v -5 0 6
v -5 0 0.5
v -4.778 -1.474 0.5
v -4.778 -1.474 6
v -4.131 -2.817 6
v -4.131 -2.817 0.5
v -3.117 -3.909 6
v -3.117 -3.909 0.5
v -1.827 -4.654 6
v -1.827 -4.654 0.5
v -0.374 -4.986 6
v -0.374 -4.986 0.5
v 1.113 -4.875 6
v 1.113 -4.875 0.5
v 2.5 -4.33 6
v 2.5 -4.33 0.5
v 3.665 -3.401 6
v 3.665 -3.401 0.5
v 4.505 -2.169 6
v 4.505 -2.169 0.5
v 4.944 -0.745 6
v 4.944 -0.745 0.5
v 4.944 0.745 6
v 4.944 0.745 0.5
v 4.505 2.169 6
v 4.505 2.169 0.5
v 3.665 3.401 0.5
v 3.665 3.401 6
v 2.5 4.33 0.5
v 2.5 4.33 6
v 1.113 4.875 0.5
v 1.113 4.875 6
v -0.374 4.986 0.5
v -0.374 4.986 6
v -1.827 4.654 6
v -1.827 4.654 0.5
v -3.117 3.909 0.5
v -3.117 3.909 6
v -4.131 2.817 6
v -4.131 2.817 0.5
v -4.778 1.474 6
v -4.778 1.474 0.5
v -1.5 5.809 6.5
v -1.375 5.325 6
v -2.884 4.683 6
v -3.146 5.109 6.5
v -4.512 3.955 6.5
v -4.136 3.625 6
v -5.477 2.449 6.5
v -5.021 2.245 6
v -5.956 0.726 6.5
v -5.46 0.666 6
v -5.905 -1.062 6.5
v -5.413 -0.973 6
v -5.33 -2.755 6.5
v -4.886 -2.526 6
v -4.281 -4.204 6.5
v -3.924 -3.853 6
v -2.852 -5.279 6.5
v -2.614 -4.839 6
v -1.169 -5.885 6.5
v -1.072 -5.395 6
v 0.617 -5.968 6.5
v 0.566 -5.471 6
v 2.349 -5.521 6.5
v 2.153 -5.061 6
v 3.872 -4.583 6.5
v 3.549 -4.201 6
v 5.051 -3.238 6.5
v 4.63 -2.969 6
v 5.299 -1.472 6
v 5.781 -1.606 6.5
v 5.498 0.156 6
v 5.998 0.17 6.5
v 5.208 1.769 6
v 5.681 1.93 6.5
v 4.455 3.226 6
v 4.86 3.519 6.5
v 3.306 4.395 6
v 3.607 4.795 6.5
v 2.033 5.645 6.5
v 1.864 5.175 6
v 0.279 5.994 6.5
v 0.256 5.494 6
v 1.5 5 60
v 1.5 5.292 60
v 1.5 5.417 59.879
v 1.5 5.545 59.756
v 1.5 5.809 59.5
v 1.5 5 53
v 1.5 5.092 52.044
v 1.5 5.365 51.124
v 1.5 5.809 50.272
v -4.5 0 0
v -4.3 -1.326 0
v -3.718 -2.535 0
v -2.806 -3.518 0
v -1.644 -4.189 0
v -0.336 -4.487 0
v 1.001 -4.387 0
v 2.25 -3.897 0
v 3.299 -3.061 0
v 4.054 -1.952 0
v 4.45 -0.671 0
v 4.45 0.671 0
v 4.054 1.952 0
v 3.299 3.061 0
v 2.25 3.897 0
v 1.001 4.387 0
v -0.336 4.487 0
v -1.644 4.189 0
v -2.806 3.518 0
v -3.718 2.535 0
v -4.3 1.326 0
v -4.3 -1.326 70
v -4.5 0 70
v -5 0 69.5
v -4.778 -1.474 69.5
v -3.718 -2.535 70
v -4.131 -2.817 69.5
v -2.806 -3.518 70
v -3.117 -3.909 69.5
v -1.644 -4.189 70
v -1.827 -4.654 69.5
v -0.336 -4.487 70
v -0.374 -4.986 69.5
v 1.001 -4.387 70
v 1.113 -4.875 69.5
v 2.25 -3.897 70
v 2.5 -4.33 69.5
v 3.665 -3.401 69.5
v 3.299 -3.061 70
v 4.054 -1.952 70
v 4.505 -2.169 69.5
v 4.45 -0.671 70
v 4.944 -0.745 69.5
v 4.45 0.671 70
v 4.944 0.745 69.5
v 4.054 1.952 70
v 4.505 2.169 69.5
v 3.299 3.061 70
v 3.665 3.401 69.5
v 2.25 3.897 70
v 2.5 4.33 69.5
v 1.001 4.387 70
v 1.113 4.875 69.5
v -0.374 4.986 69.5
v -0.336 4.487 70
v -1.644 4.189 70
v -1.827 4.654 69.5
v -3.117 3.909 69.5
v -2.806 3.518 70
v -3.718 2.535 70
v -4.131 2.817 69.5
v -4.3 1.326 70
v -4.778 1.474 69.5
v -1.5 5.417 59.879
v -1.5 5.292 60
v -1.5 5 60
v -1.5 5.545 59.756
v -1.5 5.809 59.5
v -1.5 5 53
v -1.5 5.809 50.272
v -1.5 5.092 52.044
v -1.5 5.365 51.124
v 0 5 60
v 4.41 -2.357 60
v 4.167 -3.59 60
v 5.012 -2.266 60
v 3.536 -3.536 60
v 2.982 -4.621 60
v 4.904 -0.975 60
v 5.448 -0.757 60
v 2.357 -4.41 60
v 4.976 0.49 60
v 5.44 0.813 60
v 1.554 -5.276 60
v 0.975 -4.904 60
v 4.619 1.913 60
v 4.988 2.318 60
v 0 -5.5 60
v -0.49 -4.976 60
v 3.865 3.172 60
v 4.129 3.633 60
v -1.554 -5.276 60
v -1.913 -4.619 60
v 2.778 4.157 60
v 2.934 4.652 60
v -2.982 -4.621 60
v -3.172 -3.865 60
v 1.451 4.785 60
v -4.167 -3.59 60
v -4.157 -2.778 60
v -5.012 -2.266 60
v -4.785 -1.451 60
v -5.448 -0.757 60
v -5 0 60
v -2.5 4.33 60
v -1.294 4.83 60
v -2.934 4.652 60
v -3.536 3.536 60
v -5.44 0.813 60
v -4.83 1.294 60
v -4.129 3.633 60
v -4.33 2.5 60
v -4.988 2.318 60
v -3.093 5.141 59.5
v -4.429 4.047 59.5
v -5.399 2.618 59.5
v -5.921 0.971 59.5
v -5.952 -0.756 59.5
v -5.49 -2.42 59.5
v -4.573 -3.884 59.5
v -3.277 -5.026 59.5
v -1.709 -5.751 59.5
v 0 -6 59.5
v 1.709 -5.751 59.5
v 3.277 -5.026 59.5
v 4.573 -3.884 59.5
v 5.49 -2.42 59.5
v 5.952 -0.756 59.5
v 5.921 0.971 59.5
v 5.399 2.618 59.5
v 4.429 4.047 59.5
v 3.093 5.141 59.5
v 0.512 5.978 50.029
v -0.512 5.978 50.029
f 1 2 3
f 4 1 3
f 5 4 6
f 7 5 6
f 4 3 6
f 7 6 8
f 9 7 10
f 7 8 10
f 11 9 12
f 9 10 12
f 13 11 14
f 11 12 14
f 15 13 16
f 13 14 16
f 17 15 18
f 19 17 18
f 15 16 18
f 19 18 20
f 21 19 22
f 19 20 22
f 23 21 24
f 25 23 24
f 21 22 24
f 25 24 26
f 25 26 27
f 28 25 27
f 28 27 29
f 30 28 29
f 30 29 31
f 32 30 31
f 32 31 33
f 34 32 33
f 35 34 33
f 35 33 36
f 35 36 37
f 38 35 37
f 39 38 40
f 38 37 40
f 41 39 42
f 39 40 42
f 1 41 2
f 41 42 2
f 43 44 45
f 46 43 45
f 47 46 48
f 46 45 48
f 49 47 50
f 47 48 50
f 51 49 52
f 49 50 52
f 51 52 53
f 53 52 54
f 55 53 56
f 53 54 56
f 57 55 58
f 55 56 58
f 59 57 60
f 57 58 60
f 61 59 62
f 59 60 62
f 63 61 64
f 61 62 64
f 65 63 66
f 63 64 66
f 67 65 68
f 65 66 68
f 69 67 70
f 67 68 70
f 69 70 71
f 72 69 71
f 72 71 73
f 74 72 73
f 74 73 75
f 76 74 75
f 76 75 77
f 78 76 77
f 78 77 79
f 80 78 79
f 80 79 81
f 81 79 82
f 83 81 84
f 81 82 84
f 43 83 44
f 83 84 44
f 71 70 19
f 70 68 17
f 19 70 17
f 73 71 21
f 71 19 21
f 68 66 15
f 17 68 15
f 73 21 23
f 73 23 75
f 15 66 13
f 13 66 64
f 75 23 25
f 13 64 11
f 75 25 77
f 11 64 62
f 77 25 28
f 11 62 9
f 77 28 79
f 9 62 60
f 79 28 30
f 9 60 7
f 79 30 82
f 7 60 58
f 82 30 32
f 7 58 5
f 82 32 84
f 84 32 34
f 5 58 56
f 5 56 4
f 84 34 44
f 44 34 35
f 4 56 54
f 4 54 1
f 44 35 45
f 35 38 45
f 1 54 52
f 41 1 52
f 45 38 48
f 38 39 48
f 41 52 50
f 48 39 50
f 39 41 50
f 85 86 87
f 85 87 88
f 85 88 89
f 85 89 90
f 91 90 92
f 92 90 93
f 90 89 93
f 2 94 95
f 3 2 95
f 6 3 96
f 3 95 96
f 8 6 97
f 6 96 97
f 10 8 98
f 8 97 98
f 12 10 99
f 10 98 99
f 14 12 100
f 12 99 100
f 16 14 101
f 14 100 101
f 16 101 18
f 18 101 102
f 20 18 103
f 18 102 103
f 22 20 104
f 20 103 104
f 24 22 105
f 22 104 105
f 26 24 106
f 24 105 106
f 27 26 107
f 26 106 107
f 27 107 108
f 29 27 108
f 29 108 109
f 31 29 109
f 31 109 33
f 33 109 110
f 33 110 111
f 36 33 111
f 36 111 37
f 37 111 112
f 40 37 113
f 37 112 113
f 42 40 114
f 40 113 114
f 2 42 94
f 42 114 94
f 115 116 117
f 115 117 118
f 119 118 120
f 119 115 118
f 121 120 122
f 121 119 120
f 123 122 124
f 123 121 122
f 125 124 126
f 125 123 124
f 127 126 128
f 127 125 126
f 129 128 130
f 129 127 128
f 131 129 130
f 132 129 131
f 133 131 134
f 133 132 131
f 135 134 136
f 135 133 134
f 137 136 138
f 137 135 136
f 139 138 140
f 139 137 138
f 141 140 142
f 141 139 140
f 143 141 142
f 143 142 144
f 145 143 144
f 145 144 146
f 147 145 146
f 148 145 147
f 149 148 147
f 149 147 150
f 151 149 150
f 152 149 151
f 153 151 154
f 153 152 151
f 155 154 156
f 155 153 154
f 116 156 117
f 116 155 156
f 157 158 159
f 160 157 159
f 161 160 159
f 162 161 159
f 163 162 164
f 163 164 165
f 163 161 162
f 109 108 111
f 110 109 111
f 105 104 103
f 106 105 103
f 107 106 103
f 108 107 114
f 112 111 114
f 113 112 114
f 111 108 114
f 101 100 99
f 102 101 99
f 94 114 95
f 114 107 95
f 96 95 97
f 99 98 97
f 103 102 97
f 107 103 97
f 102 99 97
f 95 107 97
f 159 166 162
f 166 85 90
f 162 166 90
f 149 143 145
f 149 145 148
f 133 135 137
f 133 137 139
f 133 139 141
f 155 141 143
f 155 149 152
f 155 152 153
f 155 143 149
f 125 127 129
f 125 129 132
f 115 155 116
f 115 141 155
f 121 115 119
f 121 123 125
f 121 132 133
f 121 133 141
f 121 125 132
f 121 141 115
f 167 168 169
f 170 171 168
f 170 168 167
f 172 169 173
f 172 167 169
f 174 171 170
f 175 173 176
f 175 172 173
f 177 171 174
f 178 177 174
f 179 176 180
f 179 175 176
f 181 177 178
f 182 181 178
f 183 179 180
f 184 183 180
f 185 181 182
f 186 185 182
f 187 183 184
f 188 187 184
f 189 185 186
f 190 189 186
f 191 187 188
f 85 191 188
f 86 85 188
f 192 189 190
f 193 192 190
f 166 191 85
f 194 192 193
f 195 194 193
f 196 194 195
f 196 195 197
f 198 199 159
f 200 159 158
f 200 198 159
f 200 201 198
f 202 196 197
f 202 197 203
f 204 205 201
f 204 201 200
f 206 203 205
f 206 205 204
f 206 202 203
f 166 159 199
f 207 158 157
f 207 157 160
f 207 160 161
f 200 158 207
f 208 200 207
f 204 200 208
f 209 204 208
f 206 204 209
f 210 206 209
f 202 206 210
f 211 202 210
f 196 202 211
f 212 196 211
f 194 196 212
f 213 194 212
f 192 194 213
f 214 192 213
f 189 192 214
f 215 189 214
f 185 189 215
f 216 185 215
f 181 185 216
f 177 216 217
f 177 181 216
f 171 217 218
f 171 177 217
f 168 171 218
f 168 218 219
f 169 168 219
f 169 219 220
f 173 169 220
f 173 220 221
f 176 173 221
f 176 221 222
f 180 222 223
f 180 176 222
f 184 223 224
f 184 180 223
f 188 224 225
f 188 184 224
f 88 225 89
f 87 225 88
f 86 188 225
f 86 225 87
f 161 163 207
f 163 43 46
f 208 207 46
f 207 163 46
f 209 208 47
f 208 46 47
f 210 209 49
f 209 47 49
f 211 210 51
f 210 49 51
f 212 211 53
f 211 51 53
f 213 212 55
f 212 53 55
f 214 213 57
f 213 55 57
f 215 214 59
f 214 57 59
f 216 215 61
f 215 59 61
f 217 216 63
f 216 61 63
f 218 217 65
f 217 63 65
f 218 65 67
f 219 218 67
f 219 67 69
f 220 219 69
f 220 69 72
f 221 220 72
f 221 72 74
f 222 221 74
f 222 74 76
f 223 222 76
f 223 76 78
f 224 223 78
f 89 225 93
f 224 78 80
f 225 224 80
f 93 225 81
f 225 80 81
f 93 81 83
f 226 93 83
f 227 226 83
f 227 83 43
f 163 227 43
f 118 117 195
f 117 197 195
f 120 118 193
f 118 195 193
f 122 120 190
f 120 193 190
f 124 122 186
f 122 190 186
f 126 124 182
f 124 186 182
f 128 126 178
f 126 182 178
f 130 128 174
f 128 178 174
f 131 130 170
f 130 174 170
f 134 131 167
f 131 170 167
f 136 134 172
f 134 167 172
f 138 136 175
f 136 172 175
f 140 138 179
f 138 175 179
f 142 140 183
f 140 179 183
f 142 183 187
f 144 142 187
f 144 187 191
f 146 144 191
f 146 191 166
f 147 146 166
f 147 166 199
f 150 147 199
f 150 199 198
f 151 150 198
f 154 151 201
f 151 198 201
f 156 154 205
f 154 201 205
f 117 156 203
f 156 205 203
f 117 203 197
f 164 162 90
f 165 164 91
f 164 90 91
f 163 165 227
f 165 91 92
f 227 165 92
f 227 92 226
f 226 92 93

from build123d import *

# Parameters (mm, degrees)
ESQUISSE1_R             = 5
BASE_EXTRUSION_DEPTH    = 6
ESQUISSE2_R             = 6
BOSS_EXTRU_1_DEPTH      = 54
ESQUISSE3_R             = 5
BOSS_EXTRU_2_DEPTH      = 10
CHANFREIN1_SIZE         = 0.5
ENL_V_MAT_EXTRU_1_DEPTH = 1.5


with BuildPart() as part:
    # Esquisse1 → Base-Extrusion (new body)
    with BuildSketch(Plane.XY):
        with Locations(Location((0, 0, 0), (0, 0, 180))):
            Circle(ESQUISSE1_R)
    extrude(amount=BASE_EXTRUSION_DEPTH)

    # Esquisse2 → Boss.-Extru.1 (add)
    with BuildSketch(Plane.XY.offset(6)):
        with Locations(Location((0, 0, 0), (0, 0, 104.477512186))):
            Circle(ESQUISSE2_R)
    extrude(amount=BOSS_EXTRU_1_DEPTH)

    # Esquisse3 → Boss.-Extru.2 (add)
    with BuildSketch(Plane.XY.offset(60)):
        with Locations(Location((0, 0, 0), (0, 0, 180))):
            Circle(ESQUISSE3_R)
    extrude(amount=BOSS_EXTRU_2_DEPTH)

    # Chanfrein1
    chanfrein1_edges = [part.edges().sort_by_distance(p)[0] for p in [
        (1.5, -5.809475019, 6),
        (1.5, -5.809475019, 60),
        (5, 0, 0),
        (5, 0, 70),
    ]]
    chamfer(chanfrein1_edges, length=CHANFREIN1_SIZE)

    # Esquisse5 → Enlèv. mat.-Extru.1 (cut, symmetric)
    with BuildSketch(Plane(origin=(0, 0, 0), x_dir=(0, 0, -1), z_dir=(1, 0, 0))):
        with BuildLine():
            Line((-60, 5), (-53, 5))
            ThreePointArc((-53, 5), (-49.464466094, 13.535533906), (-58, 10))
            Line((-58, 10), (-60, 10))
            Line((-60, 10), (-60, 5))
        make_face()
    extrude(amount=ENL_V_MAT_EXTRU_1_DEPTH, both=True, mode=Mode.SUBTRACT)


solid = part.part
